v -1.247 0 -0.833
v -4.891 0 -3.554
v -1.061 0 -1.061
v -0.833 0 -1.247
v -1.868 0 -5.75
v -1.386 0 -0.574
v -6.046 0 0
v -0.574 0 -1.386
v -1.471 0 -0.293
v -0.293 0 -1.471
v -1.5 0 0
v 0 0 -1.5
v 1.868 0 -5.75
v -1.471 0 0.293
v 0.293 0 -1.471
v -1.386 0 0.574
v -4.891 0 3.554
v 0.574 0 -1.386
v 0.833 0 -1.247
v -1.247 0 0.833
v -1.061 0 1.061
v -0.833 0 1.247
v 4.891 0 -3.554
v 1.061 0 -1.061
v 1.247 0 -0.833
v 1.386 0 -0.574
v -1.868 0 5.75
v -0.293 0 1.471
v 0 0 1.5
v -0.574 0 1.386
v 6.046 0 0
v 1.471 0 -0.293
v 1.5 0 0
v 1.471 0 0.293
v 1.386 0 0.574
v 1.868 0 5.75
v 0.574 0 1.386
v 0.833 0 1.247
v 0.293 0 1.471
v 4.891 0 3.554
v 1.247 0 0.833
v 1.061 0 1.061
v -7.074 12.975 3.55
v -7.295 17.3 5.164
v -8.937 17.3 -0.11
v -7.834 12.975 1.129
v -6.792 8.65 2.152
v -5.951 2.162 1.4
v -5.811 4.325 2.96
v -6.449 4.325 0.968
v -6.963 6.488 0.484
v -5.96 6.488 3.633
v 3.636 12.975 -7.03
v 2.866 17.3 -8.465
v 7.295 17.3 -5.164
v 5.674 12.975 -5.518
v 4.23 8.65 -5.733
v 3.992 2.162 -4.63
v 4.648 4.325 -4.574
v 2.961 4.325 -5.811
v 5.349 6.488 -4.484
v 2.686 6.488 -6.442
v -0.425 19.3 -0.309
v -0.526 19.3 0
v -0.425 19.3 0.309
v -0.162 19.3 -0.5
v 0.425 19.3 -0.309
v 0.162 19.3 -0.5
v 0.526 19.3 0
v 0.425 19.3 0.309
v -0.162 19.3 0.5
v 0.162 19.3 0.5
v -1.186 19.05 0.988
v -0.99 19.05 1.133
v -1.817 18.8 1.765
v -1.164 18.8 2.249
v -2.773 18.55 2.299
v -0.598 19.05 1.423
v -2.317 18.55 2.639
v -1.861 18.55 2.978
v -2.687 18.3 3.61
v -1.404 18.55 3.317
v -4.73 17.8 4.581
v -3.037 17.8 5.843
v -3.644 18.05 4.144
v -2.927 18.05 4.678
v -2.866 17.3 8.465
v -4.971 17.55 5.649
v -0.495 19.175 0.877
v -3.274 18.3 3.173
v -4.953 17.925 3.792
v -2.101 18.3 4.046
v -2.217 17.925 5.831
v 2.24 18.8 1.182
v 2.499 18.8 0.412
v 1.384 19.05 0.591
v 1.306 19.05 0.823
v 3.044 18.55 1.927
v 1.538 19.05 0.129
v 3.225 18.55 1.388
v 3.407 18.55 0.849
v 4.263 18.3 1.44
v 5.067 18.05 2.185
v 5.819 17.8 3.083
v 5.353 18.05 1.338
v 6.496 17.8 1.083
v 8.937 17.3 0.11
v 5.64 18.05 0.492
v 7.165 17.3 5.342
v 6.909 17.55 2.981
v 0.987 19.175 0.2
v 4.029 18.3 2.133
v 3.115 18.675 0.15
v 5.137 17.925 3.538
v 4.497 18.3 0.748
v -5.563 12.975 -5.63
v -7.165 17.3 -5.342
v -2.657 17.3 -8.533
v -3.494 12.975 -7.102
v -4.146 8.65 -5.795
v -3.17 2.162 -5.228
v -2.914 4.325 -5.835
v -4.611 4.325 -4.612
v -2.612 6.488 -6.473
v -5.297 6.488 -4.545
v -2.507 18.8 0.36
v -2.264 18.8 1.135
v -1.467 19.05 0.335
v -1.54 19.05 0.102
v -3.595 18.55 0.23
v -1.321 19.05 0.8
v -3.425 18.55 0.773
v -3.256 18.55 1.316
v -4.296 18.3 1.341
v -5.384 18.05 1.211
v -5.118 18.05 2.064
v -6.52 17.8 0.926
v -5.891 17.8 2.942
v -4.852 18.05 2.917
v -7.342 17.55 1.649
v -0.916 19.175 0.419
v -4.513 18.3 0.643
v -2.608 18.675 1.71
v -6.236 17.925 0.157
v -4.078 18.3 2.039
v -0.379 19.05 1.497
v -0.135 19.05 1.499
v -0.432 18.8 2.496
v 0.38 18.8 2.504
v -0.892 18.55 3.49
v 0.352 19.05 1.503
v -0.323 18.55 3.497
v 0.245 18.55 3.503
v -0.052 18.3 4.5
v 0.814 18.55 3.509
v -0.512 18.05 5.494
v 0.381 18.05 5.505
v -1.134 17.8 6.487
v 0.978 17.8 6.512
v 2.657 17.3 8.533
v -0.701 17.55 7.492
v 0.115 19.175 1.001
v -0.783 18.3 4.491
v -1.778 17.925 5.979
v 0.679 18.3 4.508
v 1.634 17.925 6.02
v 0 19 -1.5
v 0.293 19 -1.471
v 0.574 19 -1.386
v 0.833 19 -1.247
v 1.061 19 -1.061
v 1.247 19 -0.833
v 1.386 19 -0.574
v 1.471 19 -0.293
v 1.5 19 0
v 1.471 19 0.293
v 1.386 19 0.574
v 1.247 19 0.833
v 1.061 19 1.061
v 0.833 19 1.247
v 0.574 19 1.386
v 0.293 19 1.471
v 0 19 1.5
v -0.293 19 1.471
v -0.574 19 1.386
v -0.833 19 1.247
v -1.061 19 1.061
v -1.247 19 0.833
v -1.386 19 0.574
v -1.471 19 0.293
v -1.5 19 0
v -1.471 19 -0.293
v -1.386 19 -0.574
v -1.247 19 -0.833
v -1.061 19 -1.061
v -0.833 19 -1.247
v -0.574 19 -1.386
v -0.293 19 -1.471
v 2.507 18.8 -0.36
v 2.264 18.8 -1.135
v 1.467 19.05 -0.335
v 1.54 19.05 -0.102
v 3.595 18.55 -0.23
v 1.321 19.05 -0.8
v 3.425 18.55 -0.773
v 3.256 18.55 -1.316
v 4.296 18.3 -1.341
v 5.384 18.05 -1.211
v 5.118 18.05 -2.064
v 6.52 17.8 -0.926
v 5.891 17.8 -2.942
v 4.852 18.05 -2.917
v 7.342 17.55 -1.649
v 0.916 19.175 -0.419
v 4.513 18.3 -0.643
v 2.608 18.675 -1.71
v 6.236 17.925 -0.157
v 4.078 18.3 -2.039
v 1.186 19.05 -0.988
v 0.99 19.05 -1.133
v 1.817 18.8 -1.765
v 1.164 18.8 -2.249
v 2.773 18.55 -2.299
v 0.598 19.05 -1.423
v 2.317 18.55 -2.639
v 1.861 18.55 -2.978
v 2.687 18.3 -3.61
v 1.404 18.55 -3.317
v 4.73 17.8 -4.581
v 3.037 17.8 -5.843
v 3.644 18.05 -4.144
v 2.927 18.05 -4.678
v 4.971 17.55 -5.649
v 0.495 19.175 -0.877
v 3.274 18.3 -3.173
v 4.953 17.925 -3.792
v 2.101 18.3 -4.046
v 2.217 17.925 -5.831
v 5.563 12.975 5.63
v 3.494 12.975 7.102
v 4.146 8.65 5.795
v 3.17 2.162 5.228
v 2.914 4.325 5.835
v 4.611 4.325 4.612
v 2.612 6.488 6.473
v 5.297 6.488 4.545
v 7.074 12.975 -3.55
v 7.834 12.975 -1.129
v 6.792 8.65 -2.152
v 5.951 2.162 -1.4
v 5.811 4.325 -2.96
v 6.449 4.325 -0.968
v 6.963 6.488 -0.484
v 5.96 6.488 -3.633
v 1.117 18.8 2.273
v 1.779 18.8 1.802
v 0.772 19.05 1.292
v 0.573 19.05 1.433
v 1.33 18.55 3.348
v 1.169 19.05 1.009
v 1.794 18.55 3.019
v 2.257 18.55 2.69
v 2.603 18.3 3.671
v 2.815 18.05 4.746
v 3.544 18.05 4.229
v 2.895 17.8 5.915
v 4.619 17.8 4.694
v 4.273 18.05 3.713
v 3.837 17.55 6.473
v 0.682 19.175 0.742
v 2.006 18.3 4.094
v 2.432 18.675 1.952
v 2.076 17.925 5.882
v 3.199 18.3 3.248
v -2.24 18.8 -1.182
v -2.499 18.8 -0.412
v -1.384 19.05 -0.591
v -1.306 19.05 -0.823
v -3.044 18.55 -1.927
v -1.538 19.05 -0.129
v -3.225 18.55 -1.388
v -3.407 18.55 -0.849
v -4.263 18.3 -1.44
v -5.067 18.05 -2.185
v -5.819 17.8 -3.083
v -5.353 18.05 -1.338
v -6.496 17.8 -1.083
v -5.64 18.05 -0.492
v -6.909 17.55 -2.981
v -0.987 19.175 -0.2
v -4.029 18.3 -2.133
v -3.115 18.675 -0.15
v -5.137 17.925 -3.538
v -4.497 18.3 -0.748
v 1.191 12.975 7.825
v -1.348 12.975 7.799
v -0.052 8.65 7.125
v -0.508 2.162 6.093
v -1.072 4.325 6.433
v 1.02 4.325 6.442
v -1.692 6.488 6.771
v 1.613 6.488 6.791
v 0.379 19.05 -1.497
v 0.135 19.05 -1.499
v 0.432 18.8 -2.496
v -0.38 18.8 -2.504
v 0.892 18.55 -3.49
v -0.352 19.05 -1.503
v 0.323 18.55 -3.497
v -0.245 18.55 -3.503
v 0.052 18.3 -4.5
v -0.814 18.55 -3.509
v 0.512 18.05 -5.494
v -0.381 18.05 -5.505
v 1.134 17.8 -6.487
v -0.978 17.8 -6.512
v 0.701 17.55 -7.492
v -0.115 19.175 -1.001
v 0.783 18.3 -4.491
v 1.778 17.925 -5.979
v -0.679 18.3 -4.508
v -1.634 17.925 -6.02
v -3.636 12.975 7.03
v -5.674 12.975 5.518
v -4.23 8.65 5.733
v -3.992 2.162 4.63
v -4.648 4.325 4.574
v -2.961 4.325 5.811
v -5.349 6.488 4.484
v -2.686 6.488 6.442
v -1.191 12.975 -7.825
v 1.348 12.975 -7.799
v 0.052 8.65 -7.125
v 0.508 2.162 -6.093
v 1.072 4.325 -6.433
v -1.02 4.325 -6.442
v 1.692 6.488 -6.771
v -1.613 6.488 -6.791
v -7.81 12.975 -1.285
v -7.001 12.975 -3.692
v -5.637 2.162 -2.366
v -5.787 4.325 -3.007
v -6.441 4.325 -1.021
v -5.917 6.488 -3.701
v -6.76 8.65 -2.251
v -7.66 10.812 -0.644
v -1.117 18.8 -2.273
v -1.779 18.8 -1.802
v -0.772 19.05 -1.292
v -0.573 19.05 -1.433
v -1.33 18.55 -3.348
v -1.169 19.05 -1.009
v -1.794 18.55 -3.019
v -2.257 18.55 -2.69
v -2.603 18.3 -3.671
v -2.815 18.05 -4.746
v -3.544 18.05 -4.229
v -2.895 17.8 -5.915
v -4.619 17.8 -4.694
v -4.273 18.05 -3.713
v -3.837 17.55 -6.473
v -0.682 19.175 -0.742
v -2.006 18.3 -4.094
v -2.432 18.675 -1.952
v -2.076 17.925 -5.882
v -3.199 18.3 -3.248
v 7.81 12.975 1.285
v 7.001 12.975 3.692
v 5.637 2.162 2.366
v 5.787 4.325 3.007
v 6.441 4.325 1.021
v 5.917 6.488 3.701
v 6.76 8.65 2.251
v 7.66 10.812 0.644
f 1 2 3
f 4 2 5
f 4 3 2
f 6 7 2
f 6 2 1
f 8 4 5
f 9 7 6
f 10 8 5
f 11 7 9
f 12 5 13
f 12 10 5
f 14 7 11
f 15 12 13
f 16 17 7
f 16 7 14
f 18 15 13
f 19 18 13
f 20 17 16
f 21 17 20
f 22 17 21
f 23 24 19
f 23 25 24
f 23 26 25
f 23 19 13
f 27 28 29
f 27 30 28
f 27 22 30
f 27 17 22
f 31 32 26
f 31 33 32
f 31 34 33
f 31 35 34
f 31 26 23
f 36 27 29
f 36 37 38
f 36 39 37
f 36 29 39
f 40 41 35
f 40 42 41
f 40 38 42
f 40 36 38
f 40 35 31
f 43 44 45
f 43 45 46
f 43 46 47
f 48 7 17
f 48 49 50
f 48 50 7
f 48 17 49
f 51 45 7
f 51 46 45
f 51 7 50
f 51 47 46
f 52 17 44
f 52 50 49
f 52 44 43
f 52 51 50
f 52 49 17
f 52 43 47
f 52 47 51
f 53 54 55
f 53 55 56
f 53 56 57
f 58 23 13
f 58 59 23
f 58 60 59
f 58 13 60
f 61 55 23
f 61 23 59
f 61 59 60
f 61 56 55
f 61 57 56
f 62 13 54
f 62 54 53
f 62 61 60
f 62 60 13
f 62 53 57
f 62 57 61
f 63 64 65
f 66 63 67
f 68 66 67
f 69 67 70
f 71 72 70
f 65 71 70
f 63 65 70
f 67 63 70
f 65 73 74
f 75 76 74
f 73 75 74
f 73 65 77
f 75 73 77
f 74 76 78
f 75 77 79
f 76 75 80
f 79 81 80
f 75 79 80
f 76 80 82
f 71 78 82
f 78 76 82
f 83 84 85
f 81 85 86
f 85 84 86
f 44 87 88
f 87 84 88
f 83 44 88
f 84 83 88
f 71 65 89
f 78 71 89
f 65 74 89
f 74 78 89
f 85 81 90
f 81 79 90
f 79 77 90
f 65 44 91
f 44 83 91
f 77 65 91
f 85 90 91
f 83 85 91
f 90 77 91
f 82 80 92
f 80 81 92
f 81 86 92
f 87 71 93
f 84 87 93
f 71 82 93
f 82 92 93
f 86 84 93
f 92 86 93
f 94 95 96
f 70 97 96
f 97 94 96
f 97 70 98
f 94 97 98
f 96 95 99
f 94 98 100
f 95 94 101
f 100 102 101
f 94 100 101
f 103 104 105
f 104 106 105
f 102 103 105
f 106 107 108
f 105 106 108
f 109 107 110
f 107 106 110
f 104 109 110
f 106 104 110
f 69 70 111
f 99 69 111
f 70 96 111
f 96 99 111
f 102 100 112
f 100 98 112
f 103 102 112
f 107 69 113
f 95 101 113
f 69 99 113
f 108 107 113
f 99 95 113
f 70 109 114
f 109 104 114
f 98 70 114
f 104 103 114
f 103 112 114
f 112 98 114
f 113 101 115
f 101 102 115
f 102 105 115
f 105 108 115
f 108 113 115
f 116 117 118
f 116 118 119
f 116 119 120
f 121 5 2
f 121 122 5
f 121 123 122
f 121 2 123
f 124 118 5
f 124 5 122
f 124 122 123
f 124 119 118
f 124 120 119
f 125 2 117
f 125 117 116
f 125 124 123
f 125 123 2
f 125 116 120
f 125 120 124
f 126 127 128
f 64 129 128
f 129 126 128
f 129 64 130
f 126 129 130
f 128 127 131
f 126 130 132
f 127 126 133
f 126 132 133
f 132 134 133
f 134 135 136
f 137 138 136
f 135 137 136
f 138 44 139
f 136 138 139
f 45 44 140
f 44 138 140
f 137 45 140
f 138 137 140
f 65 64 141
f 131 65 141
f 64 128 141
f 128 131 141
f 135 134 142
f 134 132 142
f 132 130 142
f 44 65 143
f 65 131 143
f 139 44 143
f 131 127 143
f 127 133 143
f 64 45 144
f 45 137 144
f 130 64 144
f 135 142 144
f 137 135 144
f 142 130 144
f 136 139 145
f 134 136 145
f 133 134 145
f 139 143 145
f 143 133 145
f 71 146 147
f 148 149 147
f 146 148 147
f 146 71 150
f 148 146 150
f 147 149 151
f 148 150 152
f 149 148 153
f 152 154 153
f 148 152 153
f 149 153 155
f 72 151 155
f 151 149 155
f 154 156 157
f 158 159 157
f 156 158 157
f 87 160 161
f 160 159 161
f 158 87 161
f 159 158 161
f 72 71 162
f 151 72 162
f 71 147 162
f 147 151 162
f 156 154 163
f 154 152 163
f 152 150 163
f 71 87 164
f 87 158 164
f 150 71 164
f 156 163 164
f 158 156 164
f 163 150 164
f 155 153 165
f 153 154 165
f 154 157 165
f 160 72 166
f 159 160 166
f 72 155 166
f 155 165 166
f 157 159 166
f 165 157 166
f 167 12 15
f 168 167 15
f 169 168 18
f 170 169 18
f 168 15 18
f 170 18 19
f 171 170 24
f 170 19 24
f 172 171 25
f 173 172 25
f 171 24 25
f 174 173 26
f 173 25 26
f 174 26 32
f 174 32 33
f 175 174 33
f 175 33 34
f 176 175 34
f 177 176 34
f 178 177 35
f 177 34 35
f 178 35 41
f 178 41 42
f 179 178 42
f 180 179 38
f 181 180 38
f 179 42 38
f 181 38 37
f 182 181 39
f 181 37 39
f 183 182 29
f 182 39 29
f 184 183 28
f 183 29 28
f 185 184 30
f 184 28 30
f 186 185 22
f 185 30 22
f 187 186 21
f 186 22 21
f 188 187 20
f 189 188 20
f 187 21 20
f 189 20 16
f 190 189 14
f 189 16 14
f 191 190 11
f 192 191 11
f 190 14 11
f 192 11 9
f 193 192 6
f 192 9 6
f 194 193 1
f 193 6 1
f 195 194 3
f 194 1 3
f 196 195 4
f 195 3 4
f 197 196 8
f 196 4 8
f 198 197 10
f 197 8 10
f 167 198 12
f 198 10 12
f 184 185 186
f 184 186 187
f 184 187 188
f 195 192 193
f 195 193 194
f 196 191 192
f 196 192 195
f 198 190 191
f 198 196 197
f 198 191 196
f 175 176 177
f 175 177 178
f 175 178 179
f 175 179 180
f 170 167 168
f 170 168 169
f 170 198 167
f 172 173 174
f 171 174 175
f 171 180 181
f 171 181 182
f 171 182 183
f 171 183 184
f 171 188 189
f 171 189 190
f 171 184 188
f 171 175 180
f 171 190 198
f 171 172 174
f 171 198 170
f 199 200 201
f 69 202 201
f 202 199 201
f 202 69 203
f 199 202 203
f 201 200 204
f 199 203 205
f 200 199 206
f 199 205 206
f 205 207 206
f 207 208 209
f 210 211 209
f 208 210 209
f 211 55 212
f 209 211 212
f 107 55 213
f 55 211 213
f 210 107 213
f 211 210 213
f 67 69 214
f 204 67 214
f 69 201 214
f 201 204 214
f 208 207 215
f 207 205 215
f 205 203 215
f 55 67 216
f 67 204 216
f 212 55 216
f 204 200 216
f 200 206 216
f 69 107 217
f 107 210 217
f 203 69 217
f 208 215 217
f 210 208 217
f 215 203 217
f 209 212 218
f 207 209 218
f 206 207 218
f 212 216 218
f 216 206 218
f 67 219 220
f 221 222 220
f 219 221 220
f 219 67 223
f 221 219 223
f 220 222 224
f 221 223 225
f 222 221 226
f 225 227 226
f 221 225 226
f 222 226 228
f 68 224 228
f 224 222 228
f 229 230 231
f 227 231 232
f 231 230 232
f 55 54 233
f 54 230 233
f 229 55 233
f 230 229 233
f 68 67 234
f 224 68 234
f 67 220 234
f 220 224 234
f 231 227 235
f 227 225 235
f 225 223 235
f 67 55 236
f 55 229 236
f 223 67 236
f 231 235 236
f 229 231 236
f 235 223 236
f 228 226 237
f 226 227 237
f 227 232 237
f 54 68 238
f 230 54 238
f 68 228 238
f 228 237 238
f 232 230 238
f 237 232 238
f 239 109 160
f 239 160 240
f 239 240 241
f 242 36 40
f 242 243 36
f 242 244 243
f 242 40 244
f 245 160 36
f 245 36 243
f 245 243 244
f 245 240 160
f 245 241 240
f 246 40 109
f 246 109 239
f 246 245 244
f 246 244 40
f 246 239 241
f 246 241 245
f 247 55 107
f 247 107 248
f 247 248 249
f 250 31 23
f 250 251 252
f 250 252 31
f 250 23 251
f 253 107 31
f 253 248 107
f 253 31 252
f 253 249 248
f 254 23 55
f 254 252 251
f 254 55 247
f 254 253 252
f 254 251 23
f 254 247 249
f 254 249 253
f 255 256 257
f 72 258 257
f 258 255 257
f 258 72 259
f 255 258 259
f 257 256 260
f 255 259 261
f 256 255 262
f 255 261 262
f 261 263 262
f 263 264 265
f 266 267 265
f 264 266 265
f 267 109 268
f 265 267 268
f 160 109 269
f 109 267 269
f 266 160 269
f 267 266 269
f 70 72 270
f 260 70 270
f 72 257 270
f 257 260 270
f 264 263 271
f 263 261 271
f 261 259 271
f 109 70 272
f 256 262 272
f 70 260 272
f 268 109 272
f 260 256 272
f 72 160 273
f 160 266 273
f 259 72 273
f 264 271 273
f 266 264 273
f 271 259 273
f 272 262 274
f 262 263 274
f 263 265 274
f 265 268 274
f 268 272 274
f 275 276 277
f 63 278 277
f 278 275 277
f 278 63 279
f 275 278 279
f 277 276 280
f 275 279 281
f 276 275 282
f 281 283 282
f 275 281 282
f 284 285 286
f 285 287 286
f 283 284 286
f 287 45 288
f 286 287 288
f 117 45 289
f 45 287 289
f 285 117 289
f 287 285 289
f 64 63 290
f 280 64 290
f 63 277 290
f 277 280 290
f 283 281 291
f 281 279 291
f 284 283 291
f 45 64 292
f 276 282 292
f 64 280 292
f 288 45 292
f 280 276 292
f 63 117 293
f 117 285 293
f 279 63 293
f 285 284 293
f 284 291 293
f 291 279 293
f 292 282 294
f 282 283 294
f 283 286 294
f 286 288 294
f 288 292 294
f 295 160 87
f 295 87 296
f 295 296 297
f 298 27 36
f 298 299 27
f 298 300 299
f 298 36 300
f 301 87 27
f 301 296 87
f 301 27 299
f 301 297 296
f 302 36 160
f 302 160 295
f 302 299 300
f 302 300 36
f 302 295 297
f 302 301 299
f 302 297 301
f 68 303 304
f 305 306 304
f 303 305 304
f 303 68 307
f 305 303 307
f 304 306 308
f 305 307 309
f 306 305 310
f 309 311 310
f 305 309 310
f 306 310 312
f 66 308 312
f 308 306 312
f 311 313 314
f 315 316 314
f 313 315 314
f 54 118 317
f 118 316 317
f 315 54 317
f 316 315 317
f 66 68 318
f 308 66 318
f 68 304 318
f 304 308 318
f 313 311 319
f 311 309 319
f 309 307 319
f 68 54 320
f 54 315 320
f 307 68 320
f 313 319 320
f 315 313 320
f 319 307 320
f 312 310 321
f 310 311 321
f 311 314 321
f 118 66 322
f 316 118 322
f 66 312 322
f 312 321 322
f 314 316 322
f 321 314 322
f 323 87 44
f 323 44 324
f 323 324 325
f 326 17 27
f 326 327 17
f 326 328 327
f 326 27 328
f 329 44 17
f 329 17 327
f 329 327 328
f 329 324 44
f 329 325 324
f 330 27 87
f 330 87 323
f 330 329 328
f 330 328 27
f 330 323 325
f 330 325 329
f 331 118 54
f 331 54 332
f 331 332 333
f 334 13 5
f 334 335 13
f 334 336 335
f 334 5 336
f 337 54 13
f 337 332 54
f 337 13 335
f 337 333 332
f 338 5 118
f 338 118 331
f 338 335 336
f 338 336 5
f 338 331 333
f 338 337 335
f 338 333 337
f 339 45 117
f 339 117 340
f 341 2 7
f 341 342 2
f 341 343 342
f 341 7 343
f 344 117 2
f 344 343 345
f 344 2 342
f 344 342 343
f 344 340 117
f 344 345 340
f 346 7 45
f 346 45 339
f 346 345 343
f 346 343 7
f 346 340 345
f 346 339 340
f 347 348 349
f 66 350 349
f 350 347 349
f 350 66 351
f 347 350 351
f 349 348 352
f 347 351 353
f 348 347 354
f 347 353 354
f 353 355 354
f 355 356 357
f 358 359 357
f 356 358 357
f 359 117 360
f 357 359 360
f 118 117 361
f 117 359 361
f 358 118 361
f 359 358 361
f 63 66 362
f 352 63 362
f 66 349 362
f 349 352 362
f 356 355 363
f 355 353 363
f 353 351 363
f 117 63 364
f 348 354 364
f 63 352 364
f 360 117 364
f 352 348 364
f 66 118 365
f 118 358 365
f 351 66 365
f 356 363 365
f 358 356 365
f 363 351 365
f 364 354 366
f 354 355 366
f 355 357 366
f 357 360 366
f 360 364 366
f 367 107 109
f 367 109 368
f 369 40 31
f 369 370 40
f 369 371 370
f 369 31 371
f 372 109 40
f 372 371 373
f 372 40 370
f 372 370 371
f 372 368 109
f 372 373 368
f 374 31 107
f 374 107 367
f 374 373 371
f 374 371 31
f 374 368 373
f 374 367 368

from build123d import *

# Parameters (mm, degrees)
CROQUIS5_R            = 1.5
CORTAR_EXTRUIR1_DEPTH = 19


with BuildPart() as part:
    # Croquis1 → Recubrir1 section 0
    with BuildSketch(Plane(origin=(0, 0, 0), x_dir=(1, 0, 0), z_dir=(0, 1, 0))):
        with BuildLine():
            Line((-6.045907789, 0), (-4.891242148, -3.553695435))
            Line((-4.891242148, -3.553695435), (-1.868288253, -5.75))
            Line((-1.868288253, -5.75), (1.868288253, -5.75))
            Line((1.868288253, -5.75), (4.891242148, -3.553695435))
            Line((4.891242148, -3.553695435), (6.045907789, 0))
            Line((6.045907789, 0), (4.891242148, 3.553695435))
            Line((4.891242148, 3.553695435), (1.868288253, 5.75))
            Line((1.868288253, 5.75), (-1.868288253, 5.75))
            Line((-1.868288253, 5.75), (-4.891242148, 3.553695435))
            Line((-4.891242148, 3.553695435), (-6.045907789, 0))
        make_face()
    # Croquis2 → Recubrir1 section 1
    with BuildSketch(Plane(origin=(0, 17.3, 0), x_dir=(1, 0, 0), z_dir=(0, 1, 0))):
        with BuildLine():
            Line((-8.936753451, 0.109878116), (-7.294570153, -5.163998619))
            Line((-7.294570153, -5.163998619), (-2.866108989, -8.465403399))
            Line((-2.866108989, -8.465403399), (2.657108393, -8.53331181))
            Line((2.657108393, -8.53331181), (7.16540068, -5.341785145))
            Line((7.16540068, -5.341785145), (8.936753451, -0.109878116))
            Line((8.936753451, -0.109878116), (7.294570153, 5.163998619))
            Line((7.294570153, 5.163998619), (2.866108989, 8.465403399))
            Line((2.866108989, 8.465403399), (-2.657108393, 8.53331181))
            Line((-2.657108393, 8.53331181), (-7.16540068, 5.341785145))
            Line((-7.16540068, 5.341785145), (-8.936753451, 0.109878116))
        make_face()
    loft()

    # Croquis4 → Recubrir2 section 0
    with BuildSketch(Plane(origin=(0, 19.3, 0), x_dir=(1, 0, 0), z_dir=(0, 1, 0))):
        with BuildLine():
            Line((-0.525731112, 0), (-0.425325404, -0.309016994))
            Line((-0.425325404, -0.309016994), (-0.162459848, -0.5))
            Line((-0.162459848, -0.5), (0.162459848, -0.5))
            Line((0.162459848, -0.5), (0.425325404, -0.309016994))
            Line((0.425325404, -0.309016994), (0.525731112, 0))
            Line((0.525731112, 0), (0.425325404, 0.309016994))
            Line((0.425325404, 0.309016994), (0.162459848, 0.5))
            Line((0.162459848, 0.5), (-0.162459848, 0.5))
            Line((-0.162459848, 0.5), (-0.425325404, 0.309016994))
            Line((-0.425325404, 0.309016994), (-0.525731112, 0))
        make_face()
    # Croquis2<3> → Recubrir2 section 1
    with BuildSketch(Plane(origin=(0, 17.3, 0), x_dir=(1, 0, 0), z_dir=(0, 1, 0))):
        with BuildLine():
            Line((-8.936753451, 0.109878116), (-7.294570153, -5.163998619))
            Line((-7.294570153, -5.163998619), (-2.866108989, -8.465403399))
            Line((-2.866108989, -8.465403399), (2.657108393, -8.53331181))
            Line((2.657108393, -8.53331181), (7.16540068, -5.341785145))
            Line((7.16540068, -5.341785145), (8.936753451, -0.109878116))
            Line((8.936753451, -0.109878116), (7.294570153, 5.163998619))
            Line((7.294570153, 5.163998619), (2.866108989, 8.465403399))
            Line((2.866108989, 8.465403399), (-2.657108393, 8.53331181))
            Line((-2.657108393, 8.53331181), (-7.16540068, 5.341785145))
            Line((-7.16540068, 5.341785145), (-8.936753451, 0.109878116))
        make_face()
    loft()

    # Croquis5 → Cortar-Extruir1 (cut)
    with BuildSketch(Plane.XZ):
        Circle(CROQUIS5_R)
    extrude(amount=-CORTAR_EXTRUIR1_DEPTH, mode=Mode.SUBTRACT)


solid = part.part
